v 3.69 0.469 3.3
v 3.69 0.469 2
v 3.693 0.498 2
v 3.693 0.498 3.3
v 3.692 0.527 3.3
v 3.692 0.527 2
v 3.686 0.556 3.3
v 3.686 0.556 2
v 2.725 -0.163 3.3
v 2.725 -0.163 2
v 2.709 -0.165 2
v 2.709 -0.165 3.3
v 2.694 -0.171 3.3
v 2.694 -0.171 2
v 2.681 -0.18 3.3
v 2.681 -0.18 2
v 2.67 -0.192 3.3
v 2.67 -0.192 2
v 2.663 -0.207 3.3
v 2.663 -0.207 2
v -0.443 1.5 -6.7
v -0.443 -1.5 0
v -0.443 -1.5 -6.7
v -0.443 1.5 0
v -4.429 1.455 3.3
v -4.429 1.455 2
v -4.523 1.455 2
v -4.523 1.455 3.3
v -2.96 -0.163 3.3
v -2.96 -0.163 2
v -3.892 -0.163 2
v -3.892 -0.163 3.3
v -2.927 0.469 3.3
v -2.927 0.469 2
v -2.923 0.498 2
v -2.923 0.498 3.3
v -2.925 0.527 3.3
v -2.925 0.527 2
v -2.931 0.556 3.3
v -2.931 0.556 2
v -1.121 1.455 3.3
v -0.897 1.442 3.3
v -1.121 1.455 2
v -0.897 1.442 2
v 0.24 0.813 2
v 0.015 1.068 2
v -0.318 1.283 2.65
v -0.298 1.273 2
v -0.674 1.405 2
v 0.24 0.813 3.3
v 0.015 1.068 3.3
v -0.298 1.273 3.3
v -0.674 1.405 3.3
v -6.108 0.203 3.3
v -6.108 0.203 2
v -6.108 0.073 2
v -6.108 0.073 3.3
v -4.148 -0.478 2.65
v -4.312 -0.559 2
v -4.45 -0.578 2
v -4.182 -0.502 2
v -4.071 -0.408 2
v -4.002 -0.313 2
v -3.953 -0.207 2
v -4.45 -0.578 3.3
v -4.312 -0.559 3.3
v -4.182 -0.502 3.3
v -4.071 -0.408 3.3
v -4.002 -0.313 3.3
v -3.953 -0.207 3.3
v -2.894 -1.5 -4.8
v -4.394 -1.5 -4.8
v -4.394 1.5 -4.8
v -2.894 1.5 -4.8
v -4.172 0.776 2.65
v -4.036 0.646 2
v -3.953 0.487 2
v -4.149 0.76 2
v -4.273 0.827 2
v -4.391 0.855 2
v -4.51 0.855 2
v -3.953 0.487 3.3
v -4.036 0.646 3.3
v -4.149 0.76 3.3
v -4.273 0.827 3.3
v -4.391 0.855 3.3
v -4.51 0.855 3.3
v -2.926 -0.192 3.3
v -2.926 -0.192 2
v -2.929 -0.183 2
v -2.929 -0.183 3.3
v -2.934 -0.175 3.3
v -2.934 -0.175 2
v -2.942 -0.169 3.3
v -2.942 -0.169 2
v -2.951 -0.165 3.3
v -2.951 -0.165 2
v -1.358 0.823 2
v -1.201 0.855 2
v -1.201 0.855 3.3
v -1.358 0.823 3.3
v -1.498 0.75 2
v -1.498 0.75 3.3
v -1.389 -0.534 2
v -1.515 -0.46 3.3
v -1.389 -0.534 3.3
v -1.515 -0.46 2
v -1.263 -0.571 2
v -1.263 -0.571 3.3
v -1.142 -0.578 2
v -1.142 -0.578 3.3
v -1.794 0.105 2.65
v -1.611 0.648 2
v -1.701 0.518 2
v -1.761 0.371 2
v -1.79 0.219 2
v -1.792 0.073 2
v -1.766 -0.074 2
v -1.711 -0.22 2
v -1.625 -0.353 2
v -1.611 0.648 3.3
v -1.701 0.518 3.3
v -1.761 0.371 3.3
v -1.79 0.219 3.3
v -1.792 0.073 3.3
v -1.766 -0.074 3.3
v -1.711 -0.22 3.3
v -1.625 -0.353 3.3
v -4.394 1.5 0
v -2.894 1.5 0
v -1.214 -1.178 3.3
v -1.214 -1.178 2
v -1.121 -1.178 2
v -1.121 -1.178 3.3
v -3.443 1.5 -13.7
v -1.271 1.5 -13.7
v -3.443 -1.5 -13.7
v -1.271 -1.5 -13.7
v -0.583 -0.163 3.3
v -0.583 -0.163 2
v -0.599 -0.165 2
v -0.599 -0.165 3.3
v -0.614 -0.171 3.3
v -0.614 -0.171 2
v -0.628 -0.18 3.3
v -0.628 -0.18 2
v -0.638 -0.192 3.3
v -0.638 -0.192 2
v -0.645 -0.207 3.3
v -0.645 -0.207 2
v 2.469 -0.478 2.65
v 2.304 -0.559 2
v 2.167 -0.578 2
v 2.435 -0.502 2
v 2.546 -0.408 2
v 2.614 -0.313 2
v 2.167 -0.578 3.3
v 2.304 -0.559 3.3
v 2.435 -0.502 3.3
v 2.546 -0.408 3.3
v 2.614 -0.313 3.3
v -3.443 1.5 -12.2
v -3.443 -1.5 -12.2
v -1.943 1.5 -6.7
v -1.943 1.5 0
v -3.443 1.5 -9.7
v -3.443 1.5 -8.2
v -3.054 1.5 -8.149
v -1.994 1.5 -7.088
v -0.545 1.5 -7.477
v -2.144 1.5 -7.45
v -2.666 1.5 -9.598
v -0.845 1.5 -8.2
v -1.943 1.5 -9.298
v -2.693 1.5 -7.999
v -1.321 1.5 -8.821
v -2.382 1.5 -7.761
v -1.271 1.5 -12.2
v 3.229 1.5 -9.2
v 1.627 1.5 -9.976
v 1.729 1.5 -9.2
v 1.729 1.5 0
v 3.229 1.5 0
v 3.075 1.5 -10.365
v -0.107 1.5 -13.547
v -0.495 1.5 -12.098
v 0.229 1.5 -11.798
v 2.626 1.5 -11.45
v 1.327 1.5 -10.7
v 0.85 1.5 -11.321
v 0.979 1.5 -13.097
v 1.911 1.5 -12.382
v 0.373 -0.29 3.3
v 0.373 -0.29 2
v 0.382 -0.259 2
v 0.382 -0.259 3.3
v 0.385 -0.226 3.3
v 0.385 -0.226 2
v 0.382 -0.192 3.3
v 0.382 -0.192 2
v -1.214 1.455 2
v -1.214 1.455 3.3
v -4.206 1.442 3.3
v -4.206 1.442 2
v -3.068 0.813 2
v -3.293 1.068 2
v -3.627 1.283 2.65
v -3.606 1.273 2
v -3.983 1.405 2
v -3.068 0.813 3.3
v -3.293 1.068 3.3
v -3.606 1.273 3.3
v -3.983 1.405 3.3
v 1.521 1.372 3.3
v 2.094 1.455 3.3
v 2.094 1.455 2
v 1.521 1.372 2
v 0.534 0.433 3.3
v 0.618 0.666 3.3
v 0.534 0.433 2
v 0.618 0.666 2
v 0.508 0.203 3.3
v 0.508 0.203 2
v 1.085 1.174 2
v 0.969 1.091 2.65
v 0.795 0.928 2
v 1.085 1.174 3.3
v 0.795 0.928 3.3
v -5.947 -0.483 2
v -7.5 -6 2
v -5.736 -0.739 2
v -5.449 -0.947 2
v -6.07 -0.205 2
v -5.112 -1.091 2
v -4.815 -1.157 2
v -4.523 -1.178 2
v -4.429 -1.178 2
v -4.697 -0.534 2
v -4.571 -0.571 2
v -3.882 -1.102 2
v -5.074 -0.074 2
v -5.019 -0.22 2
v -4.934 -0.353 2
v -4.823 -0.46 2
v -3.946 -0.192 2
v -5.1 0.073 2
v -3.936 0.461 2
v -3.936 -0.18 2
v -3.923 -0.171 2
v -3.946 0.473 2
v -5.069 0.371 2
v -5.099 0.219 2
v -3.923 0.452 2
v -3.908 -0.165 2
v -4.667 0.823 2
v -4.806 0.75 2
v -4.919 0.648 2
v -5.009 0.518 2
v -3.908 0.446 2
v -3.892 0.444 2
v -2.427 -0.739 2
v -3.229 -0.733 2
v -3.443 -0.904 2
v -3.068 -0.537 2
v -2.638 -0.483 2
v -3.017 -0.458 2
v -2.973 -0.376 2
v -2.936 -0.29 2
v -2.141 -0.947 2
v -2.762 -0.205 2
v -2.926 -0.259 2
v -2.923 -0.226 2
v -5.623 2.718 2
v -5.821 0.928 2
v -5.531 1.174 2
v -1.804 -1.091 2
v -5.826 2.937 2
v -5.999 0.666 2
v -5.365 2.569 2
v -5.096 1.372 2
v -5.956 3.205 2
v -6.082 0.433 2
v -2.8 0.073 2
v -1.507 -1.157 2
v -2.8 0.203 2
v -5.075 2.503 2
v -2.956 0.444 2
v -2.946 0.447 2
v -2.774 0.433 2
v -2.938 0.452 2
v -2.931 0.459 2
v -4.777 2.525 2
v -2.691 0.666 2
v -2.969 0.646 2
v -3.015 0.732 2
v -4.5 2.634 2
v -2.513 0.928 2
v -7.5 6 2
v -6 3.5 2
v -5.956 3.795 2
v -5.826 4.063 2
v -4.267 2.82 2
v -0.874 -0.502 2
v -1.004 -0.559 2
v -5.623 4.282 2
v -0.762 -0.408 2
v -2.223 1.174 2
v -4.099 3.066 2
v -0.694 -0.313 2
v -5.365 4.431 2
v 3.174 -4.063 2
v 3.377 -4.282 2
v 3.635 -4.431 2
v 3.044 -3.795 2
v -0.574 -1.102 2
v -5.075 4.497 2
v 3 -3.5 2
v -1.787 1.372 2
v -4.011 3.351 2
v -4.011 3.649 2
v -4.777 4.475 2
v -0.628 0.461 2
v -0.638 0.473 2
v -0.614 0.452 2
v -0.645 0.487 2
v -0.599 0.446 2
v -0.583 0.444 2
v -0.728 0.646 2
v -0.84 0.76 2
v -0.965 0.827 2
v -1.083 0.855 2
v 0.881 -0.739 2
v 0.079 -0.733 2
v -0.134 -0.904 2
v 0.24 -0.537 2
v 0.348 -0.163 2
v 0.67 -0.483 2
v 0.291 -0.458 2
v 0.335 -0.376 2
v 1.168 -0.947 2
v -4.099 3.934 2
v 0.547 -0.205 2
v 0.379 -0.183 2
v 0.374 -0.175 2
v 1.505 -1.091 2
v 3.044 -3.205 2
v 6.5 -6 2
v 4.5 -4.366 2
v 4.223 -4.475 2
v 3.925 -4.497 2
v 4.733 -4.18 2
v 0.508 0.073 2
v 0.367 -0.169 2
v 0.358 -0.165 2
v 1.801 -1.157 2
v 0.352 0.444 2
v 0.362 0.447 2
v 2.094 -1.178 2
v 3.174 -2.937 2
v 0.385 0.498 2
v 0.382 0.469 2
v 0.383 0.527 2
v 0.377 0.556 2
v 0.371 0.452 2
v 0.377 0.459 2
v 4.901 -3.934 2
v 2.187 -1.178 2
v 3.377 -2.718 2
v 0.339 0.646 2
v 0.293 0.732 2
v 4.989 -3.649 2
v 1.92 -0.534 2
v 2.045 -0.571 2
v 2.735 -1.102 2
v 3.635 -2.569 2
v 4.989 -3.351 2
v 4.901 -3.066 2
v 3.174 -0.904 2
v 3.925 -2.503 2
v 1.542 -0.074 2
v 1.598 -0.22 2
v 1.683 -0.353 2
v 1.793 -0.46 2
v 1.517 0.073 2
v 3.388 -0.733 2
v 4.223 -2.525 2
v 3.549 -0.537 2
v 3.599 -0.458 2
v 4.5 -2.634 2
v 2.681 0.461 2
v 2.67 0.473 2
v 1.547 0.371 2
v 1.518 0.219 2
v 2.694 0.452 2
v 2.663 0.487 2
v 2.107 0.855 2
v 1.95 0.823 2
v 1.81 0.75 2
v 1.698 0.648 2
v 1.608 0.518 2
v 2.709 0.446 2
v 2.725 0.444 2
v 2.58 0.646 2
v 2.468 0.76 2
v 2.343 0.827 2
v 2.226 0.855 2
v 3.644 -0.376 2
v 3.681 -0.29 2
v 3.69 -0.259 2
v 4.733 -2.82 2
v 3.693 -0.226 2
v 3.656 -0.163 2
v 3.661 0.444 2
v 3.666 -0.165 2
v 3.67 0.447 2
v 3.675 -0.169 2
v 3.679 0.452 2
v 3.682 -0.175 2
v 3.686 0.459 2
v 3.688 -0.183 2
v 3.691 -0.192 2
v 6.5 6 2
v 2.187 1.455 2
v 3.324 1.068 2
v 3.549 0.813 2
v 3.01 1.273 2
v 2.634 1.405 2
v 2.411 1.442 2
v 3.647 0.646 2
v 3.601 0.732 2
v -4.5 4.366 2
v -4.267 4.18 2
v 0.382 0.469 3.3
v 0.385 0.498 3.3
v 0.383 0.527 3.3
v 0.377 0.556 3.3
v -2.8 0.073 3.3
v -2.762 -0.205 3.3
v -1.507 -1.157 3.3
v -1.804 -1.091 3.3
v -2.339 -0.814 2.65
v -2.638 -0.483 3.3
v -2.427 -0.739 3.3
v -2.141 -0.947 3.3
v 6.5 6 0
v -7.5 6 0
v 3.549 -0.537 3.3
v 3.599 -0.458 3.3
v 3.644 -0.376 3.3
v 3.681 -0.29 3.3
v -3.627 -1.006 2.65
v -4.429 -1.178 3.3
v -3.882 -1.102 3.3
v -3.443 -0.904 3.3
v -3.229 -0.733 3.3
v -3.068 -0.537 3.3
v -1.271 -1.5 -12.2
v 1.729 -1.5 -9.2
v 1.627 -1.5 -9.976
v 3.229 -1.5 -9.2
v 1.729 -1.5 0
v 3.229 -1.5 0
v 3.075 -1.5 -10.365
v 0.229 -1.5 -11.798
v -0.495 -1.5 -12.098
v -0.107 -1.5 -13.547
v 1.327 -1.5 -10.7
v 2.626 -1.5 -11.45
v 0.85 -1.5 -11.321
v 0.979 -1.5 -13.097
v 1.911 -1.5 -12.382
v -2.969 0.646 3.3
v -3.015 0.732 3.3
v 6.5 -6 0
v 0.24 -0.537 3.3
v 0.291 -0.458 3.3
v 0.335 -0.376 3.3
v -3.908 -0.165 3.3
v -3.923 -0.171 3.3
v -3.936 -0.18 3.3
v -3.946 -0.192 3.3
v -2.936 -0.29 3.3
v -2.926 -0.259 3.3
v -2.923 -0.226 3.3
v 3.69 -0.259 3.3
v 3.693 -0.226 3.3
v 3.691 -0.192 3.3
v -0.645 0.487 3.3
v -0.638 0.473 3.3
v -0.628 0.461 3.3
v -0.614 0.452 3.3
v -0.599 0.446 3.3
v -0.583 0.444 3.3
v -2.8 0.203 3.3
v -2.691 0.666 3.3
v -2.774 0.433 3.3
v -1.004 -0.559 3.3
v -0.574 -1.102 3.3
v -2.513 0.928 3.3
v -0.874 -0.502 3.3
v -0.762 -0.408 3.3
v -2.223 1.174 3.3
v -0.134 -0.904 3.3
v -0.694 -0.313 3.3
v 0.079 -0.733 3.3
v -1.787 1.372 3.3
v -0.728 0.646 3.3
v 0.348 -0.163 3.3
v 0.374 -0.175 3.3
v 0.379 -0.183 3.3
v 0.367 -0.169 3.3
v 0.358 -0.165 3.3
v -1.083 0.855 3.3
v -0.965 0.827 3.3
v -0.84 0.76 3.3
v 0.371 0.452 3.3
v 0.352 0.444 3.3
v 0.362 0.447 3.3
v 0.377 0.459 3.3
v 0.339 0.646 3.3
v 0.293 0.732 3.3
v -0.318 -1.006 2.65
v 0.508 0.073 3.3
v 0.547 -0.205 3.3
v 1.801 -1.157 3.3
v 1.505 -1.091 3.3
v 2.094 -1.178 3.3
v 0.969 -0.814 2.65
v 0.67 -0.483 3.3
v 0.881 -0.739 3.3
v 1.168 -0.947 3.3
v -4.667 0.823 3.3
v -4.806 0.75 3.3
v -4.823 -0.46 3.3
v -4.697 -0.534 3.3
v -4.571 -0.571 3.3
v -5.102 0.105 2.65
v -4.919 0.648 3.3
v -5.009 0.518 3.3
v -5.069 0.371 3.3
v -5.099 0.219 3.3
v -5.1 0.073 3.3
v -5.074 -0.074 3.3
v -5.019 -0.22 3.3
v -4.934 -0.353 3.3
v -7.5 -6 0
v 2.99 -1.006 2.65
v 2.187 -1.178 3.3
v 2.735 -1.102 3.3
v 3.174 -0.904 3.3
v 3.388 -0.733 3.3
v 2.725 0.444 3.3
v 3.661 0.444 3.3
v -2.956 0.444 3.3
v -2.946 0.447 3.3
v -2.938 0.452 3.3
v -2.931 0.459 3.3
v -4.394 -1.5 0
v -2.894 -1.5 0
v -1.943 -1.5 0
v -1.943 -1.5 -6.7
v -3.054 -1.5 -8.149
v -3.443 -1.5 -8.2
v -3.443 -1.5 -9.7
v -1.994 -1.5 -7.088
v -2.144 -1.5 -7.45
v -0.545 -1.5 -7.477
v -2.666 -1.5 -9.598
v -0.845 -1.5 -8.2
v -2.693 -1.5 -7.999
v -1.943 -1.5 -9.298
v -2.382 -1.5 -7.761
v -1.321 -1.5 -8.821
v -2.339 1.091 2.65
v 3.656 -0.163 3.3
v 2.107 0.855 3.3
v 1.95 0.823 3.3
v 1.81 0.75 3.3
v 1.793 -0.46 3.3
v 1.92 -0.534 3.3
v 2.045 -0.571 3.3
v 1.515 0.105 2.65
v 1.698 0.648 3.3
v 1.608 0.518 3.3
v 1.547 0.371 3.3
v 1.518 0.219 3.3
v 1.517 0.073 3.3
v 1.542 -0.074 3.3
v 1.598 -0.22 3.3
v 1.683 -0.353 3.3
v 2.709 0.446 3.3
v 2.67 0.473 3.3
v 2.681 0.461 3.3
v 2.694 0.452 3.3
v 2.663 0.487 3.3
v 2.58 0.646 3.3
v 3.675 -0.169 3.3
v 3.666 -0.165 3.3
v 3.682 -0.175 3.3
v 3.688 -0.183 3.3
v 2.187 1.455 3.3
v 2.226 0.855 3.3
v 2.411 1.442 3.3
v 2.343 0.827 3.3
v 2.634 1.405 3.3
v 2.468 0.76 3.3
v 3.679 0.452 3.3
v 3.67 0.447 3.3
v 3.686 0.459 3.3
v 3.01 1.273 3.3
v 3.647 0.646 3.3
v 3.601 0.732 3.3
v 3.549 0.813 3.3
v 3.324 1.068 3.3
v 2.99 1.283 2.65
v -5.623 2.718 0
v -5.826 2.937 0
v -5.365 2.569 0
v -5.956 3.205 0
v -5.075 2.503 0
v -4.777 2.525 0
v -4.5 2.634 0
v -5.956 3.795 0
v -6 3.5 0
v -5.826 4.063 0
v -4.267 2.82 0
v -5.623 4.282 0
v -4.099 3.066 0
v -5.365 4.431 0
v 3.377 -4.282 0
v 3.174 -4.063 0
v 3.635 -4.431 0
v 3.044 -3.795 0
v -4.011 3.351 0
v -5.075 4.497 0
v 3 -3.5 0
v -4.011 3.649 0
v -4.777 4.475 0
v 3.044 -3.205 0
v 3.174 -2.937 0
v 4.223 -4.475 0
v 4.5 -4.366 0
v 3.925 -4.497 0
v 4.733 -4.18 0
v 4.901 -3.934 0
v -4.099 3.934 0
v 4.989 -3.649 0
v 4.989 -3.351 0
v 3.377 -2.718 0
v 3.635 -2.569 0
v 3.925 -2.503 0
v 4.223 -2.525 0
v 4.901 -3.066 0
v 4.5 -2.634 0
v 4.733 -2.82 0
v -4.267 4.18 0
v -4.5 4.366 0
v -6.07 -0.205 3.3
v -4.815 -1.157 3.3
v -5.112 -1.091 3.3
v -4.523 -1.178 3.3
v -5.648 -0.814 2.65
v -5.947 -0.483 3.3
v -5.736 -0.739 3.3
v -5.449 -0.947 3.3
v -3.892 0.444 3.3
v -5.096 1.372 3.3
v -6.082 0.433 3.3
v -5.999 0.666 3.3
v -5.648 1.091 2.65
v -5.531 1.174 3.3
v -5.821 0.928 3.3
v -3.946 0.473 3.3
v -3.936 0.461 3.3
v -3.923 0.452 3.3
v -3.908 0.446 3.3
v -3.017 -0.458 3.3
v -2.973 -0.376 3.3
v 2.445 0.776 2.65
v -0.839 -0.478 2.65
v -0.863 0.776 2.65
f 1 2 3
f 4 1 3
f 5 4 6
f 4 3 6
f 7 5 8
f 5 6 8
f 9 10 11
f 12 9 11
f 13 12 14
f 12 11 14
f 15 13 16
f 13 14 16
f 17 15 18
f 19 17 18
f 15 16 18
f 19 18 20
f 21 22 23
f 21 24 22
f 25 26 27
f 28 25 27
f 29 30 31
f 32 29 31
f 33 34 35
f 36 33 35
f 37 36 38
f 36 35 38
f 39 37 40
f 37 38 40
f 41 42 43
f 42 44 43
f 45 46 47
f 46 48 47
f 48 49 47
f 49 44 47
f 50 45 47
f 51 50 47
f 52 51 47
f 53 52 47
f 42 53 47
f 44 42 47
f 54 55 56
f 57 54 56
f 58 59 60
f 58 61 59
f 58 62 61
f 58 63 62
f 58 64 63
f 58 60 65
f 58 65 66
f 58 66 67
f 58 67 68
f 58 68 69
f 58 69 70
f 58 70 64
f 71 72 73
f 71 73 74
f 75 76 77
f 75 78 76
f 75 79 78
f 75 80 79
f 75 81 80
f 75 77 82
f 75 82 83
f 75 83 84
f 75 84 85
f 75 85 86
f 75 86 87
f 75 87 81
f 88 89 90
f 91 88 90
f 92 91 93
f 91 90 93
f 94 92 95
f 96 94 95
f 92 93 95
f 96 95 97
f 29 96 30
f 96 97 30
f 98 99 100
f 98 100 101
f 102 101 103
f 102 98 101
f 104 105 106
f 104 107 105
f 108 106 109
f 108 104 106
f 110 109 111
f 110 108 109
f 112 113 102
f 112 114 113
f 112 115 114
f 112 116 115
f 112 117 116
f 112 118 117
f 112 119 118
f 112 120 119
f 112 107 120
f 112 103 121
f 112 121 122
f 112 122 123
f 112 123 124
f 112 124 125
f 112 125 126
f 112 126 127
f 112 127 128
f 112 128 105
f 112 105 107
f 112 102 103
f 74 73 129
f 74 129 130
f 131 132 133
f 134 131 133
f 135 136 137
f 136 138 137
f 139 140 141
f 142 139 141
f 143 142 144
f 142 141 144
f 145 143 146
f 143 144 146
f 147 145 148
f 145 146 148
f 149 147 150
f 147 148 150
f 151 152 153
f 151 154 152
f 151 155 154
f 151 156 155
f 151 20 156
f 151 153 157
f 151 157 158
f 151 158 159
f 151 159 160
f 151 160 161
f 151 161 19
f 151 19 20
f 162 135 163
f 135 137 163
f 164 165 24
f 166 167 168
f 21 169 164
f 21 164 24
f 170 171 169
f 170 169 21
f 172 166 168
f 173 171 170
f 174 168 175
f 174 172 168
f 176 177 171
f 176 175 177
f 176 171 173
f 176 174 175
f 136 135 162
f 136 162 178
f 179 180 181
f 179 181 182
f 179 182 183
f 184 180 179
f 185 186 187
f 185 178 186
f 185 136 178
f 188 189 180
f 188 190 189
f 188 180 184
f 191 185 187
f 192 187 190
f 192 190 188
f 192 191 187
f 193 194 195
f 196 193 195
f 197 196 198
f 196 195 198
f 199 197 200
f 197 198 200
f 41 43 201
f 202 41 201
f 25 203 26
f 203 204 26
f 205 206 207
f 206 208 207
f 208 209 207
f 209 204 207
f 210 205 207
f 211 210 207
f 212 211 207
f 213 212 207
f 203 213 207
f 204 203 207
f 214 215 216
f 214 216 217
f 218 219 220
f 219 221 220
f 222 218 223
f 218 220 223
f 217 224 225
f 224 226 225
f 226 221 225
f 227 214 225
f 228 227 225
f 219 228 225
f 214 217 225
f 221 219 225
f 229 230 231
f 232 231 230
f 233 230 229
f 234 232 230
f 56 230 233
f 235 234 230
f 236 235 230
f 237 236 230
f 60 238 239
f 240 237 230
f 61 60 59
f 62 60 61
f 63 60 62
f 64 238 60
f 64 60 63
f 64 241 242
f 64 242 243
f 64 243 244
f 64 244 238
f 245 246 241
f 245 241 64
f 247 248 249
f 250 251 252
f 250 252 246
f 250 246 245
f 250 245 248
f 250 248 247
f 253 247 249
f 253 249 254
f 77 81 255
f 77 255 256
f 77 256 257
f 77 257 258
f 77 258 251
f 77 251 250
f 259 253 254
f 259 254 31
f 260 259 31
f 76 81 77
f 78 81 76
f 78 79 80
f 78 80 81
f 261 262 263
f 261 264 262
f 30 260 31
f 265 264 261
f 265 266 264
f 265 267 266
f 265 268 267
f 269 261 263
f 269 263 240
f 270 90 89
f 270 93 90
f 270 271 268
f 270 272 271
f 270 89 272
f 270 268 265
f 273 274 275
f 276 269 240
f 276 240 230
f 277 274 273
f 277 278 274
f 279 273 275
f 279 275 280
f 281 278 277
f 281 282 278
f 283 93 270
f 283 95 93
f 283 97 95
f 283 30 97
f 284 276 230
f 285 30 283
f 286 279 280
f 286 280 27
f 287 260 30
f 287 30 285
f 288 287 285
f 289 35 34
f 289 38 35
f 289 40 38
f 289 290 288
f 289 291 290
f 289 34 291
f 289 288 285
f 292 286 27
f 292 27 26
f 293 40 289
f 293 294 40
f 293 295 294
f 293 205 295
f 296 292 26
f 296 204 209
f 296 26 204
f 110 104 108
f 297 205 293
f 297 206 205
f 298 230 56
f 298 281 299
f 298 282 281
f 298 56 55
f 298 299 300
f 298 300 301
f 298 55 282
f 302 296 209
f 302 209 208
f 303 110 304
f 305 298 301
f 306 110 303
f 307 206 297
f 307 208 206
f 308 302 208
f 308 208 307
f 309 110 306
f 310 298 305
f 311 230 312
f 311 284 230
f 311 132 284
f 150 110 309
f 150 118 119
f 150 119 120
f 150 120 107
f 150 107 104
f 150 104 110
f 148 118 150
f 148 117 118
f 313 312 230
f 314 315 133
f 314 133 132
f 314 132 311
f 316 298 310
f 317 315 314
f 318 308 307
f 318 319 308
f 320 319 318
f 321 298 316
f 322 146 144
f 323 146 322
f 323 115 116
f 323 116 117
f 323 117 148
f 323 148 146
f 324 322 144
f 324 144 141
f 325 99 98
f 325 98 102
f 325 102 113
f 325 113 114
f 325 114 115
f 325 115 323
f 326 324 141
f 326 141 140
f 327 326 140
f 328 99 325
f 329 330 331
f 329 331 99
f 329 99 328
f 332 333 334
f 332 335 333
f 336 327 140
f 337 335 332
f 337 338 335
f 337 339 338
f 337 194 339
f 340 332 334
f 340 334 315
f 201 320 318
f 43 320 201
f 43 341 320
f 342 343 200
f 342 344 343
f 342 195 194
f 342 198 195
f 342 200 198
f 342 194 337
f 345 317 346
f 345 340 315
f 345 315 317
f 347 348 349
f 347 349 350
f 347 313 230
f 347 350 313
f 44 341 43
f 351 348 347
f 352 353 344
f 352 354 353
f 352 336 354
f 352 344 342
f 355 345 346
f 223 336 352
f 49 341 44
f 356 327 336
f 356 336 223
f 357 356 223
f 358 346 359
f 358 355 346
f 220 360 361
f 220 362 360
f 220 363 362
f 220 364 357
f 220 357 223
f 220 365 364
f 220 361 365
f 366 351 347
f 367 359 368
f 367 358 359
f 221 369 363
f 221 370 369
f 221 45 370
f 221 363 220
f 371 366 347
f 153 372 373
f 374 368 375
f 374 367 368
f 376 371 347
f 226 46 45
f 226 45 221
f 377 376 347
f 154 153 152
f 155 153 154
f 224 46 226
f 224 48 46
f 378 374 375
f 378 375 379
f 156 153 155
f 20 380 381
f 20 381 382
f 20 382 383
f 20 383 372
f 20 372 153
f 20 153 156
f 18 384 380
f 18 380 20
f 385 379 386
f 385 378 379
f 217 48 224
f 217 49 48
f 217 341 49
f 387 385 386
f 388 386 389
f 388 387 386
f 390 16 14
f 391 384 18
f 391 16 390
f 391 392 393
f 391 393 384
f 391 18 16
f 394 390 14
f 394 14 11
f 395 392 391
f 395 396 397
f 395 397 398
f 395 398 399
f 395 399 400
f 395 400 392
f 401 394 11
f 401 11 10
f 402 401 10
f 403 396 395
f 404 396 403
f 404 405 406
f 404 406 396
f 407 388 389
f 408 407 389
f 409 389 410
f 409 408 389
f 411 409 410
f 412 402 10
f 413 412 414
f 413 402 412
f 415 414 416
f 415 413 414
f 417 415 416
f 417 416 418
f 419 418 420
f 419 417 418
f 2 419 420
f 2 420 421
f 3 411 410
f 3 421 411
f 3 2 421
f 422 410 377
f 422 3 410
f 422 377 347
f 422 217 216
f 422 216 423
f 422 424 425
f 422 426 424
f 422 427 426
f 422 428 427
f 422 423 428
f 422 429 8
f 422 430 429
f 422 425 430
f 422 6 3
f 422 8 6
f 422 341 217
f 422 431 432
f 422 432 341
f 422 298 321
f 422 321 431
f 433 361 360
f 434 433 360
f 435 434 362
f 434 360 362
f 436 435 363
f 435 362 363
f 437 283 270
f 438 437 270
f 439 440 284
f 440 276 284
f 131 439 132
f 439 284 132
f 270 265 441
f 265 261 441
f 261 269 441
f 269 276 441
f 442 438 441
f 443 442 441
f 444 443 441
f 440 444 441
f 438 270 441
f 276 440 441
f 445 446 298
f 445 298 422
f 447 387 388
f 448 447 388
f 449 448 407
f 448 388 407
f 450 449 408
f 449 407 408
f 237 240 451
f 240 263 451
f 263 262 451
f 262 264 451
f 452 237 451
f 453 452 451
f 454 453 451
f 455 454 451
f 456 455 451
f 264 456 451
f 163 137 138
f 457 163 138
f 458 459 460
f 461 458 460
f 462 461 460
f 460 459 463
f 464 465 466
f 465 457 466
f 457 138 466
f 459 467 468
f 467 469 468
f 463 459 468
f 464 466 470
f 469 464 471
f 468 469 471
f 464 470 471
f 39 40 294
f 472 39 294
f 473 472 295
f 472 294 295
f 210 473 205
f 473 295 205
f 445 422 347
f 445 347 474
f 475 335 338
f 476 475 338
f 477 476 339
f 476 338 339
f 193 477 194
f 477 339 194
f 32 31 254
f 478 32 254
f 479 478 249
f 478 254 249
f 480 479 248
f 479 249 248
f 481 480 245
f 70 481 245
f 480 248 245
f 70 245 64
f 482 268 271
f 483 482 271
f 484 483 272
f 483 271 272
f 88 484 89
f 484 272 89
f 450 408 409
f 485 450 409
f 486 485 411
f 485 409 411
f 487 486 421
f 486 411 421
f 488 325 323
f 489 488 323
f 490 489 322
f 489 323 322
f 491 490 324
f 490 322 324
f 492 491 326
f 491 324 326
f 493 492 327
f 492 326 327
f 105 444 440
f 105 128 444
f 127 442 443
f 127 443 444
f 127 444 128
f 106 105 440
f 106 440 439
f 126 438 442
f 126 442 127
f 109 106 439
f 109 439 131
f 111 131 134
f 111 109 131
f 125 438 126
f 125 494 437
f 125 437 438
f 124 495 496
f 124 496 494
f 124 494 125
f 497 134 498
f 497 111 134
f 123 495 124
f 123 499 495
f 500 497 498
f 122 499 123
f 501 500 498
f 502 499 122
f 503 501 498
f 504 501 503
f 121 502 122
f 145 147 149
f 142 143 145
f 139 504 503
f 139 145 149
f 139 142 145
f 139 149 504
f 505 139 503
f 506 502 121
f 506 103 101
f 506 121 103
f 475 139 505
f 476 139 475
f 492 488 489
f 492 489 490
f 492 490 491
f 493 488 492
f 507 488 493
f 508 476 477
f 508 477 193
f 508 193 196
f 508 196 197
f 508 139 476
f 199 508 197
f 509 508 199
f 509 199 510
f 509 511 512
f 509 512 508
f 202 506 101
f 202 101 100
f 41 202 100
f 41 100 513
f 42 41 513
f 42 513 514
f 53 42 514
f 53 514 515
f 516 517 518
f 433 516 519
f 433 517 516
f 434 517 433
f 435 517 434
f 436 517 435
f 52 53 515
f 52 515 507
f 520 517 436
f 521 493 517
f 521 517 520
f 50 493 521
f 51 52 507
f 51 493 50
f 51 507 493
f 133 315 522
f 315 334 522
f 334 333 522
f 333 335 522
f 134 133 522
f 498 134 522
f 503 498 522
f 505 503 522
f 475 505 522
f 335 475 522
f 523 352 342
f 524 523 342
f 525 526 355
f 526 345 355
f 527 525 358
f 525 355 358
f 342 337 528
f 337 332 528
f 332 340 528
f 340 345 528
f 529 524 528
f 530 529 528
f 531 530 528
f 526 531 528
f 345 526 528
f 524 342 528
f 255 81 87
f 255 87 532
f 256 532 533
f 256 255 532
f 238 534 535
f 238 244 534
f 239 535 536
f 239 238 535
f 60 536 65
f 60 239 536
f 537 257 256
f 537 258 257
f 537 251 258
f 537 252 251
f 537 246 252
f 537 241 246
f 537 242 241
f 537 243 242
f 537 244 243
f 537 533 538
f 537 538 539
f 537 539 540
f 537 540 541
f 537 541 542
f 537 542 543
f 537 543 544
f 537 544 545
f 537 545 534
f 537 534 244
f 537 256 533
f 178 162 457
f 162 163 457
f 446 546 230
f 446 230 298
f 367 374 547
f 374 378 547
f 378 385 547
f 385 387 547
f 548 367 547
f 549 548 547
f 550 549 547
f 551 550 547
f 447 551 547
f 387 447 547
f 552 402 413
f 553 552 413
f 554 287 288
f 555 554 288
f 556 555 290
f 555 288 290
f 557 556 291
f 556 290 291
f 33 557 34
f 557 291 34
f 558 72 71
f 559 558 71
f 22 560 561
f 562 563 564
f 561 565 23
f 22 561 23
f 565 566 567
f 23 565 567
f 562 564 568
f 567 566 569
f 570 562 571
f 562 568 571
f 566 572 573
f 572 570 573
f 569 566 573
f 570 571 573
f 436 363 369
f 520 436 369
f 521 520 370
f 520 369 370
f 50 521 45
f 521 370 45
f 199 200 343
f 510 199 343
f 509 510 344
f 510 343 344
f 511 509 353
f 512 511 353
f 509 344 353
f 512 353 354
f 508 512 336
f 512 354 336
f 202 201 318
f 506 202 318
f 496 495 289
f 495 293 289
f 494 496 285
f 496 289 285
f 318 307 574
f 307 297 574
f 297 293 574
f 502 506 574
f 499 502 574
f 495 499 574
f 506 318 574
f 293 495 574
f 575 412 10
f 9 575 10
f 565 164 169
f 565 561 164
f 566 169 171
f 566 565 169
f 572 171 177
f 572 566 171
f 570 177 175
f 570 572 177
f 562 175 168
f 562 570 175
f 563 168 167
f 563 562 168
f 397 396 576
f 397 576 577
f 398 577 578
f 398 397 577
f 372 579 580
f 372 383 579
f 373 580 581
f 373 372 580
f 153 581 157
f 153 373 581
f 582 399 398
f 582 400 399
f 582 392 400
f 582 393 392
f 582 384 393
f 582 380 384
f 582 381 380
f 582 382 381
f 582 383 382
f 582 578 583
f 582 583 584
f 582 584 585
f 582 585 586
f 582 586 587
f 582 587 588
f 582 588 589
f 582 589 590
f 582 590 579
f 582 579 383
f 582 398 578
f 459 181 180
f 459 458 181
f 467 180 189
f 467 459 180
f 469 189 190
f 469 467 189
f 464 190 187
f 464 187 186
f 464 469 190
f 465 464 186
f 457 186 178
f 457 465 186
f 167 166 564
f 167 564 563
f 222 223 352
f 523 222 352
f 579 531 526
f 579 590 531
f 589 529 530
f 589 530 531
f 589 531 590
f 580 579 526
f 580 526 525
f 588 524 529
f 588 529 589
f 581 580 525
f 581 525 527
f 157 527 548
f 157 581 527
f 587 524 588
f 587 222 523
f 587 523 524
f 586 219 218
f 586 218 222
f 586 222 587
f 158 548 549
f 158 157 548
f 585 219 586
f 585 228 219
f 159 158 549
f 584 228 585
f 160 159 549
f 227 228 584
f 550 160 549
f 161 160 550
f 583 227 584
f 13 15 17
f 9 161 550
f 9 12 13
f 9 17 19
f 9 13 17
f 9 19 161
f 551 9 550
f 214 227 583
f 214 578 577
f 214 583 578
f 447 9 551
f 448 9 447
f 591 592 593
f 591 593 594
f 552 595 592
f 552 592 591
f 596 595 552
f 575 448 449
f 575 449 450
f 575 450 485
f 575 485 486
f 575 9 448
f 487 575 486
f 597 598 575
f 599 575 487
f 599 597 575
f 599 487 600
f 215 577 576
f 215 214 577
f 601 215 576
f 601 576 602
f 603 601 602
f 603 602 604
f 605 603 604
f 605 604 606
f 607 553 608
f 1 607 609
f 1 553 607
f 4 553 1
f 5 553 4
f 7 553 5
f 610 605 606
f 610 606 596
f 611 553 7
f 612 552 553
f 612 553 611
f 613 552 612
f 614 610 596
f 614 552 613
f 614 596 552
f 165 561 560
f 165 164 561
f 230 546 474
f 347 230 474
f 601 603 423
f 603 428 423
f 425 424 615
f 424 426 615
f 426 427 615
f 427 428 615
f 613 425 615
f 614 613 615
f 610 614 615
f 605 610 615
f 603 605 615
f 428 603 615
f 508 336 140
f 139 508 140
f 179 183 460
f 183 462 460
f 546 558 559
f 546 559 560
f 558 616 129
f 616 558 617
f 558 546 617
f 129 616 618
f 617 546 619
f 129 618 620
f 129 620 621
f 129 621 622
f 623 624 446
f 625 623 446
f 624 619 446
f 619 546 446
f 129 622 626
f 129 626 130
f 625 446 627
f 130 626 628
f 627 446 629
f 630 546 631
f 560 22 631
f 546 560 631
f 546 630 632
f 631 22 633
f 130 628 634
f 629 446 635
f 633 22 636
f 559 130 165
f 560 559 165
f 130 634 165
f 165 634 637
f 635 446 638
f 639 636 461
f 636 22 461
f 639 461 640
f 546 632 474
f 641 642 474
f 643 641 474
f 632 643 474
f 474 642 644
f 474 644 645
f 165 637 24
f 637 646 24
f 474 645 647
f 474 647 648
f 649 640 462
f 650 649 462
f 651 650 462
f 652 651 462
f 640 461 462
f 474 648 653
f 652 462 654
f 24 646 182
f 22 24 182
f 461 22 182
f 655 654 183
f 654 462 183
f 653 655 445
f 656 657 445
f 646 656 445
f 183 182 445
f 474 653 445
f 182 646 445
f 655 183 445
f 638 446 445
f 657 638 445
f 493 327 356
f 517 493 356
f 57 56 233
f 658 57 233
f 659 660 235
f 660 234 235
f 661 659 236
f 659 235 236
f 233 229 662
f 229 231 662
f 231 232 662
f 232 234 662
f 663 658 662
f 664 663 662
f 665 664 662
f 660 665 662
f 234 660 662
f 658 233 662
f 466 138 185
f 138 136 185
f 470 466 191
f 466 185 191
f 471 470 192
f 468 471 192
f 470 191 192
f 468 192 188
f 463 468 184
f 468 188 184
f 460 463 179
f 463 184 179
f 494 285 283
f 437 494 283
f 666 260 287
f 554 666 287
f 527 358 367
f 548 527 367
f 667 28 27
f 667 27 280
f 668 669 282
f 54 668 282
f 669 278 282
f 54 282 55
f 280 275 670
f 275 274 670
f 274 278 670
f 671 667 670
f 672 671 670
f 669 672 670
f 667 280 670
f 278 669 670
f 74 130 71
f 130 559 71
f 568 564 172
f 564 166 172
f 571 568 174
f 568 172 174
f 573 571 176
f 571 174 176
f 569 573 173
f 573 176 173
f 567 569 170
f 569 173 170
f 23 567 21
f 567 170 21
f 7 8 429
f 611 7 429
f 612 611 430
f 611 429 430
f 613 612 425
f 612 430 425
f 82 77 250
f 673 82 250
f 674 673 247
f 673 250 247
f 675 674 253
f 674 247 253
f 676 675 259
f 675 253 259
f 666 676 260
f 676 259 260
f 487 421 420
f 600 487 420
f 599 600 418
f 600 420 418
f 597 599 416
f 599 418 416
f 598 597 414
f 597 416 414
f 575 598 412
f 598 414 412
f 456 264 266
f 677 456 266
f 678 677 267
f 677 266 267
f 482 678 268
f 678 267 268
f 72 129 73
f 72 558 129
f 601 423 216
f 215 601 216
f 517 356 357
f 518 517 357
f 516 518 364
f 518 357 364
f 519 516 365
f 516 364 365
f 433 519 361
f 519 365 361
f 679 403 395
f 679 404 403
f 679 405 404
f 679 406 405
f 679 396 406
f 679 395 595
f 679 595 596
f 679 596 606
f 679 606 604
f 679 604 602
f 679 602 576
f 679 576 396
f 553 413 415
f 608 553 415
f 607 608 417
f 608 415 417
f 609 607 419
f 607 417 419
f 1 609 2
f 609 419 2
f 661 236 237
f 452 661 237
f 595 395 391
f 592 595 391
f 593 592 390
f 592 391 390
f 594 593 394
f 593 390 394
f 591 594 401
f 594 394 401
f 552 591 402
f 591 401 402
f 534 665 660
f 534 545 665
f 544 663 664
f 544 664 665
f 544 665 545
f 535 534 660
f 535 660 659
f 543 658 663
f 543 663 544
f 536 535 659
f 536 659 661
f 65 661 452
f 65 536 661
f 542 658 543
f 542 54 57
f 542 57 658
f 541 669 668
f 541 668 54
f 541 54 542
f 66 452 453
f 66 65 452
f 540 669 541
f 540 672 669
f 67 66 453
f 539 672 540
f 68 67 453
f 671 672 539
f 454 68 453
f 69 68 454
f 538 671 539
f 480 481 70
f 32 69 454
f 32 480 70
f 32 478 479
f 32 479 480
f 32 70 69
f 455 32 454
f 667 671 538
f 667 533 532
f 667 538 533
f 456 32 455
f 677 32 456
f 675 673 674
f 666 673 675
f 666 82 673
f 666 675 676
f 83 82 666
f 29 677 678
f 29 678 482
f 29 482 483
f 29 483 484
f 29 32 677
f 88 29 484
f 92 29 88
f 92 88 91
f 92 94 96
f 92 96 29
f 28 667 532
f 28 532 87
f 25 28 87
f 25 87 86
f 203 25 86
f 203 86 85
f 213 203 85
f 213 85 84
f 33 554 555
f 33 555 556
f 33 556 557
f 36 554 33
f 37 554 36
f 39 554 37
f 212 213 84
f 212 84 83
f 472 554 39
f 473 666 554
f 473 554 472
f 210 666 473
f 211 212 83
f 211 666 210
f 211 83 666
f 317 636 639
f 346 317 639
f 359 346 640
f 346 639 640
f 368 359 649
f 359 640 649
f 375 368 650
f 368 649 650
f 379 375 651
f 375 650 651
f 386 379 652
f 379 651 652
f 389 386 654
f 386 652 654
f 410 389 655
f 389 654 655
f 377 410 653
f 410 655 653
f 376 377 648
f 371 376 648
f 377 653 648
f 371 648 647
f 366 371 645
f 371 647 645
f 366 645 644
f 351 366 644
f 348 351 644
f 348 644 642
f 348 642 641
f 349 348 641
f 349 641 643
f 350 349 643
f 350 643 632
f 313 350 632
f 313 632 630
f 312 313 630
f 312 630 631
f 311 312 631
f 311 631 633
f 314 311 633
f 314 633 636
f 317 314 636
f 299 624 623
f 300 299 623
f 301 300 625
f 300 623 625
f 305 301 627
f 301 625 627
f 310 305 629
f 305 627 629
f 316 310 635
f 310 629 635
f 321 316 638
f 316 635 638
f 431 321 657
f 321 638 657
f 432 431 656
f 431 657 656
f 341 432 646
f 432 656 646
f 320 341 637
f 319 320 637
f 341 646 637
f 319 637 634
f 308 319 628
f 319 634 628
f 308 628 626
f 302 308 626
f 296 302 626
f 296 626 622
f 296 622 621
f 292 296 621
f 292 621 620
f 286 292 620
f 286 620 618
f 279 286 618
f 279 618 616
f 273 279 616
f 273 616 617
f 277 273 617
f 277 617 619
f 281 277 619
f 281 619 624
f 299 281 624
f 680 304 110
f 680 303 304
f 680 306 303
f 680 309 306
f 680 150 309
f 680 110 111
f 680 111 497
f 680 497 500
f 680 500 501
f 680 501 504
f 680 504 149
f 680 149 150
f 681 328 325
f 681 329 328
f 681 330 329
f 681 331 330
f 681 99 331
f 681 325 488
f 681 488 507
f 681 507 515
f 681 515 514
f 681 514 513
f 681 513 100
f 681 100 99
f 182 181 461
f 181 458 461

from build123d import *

# Parameters (mm, degrees)
SKETCH1_W           = 15
SKETCH1_H           = 12
BOSS_EXTRUDE1_DEPTH = 2
BOSS_EXTRUDE2_DEPTH = 2
SKETCH3_W           = 1.5
SKETCH3_H           = 4.8
BOSS_EXTRUDE3_DEPTH = 1.5
FILLET3_R           = 1.5
FILLET4_R           = 3
FILLET5_R           = 3
FILLET6_R           = 4.5
SKETCH4_W           = 2
SKETCH4_H           = 12
CUT_EXTRUDE1_DEPTH  = 1
SKETCH5_R           = 1
CUT_EXTRUDE2_DEPTH  = 17.731407672
CUT_EXTRUDE3_START  = -0.7
CUT_EXTRUDE3_DEPTH  = 0.7


with BuildPart() as part:
    # Sketch1 → Boss-Extrude1 (new body)
    with BuildSketch(Plane.XY):
        Rectangle(SKETCH1_W, SKETCH1_H)
    extrude(amount=BOSS_EXTRUDE1_DEPTH)

    # Sketch2 → Boss-Extrude2 (add)
    with BuildSketch(Plane.XY.offset(2)):
        with BuildLine():
            Line((-0.583484164, 0.443787032), (0.352350759, 0.443787032))
            ThreePointArc((0.352350759, 0.443787032), (0.370660979, 0.451874829), (0.381594807, 0.468641703))
            ThreePointArc((0.381594807, 0.468641703), (0.38478126, 0.512633483), (0.377406248, 0.556119567))
            ThreePointArc((0.377406248, 0.556119567), (0.316958398, 0.689104808), (0.240244136, 0.81341868))
            add(Edge.make_bspline(
                [(0.240244136, 0.81341868), (-0.178053426, 1.454553053), (-1.120854898, 1.454553053)],
                knots=[3.484341046, 3.484341046, 3.484341046, 4.522924348, 4.522924348, 4.522924348], degree=2, weights=[1, 0.868170926, 1]))
            Line((-1.120854898, 1.454553053), (-1.214475951, 1.454553068))
            add(Edge.make_bspline(
                [(-1.214475951, 1.454553068), (-2.800132813, 1.454553068), (-2.800132813, 0.203397992)],
                knots=[1.670440536, 1.670440536, 1.670440536, 3.203377674, 3.203377674, 3.203377674], degree=2, weights=[1, 0.720364542, 1]))
            Line((-2.800132813, 0.203397992), (-2.800132806, 0.073267738))
            add(Edge.make_bspline(
                [(-2.800132806, 0.073267738), (-2.800132806, -1.177887338), (-1.214475944, -1.177887338)],
                knots=[3.079807634, 3.079807634, 3.079807634, 4.612744771, 4.612744771, 4.612744771], degree=2, weights=[1, 0.720364542, 1]))
            Line((-1.214475944, -1.177887338), (-1.120854891, -1.177887375))
            add(Edge.make_bspline(
                [(-1.120854891, -1.177887375), (-0.178053419, -1.177887375), (0.240244143, -0.536753002)],
                knots=[1.760260959, 1.760260959, 1.760260959, 2.798844261, 2.798844261, 2.798844261], degree=2, weights=[1, 0.868170926, 1]))
            ThreePointArc((0.240244143, -0.536753002), (0.313994237, -0.417650167), (0.372658208, -0.290437354))
            ThreePointArc((0.372658208, -0.290437354), (0.384251196, -0.24211404), (0.382489087, -0.192450825))
            ThreePointArc((0.382489087, -0.192450825), (0.370484527, -0.171527836), (0.347824512, -0.163257123))
            Line((0.347824512, -0.163257123), (-0.58348421, -0.163257123))
            ThreePointArc((-0.58348421, -0.163257123), (-0.62125204, -0.175257922), (-0.645165579, -0.206858093))
            add(Edge.make_bspline(
                [(-1.141657158, -0.577741646), (-0.776549247, -0.578100851), (-0.645165579, -0.206858093)],
                knots=[5.955155363, 5.955155363, 5.955155363, 7.020735545, 7.020735545, 7.020735545], degree=2, weights=[1, 0.86139323, 1]))
            add(Edge.make_bspline(
                [(-1.201450314, 0.854894524), (-1.823540048, 0.823436889), (-1.793554178, 0.104979402), (-1.763568309, -0.613478086), (-1.141657158, -0.577741646)],
                knots=[0.039432941, 0.039432941, 0.039432941, 1.613207044, 1.613207044, 3.186981147, 3.186981147, 3.186981147], degree=2, weights=[1, 0.706053195, 1, 0.706053195, 1]))
            add(Edge.make_bspline(
                [(-0.645165584, 0.487388037), (-0.79140441, 0.900606071), (-1.201450314, 0.854894524)],
                knots=[2.404042441, 2.404042441, 2.404042441, 3.565685694, 3.565685694, 3.565685694], degree=2, weights=[1, 0.836012096, 1]))
            ThreePointArc((-0.645165584, 0.487388037), (-0.621252025, 0.455787841), (-0.583484164, 0.443787032))
        make_face()
        with BuildLine():
            Line((-3.89178871, 0.443787032), (-2.955953786, 0.443787032))
            ThreePointArc((-2.955953786, 0.443787032), (-2.937643536, 0.451874816), (-2.926709688, 0.468641703))
            ThreePointArc((-2.926709688, 0.468641703), (-2.923523234, 0.512633483), (-2.930898247, 0.556119567))
            ThreePointArc((-2.930898247, 0.556119567), (-2.991346096, 0.689104808), (-3.068060358, 0.81341868))
            add(Edge.make_bspline(
                [(-3.068060358, 0.81341868), (-3.48635792, 1.454553053), (-4.429159392, 1.454553053)],
                knots=[3.484341046, 3.484341046, 3.484341046, 4.522924348, 4.522924348, 4.522924348], degree=2, weights=[1, 0.868170926, 1]))
            Line((-4.429159392, 1.454553053), (-4.522780446, 1.454553068))
            add(Edge.make_bspline(
                [(-4.522780446, 1.454553068), (-6.108437307, 1.454553068), (-6.108437307, 0.203397992)],
                knots=[4.81203319, 4.81203319, 4.81203319, 6.344970327, 6.344970327, 6.344970327], degree=2, weights=[1, 0.720364542, 1]))
            Line((-6.108437307, 0.203397992), (-6.108437352, 0.073267738))
            add(Edge.make_bspline(
                [(-6.108437352, 0.073267738), (-6.108437352, -1.177887338), (-4.52278049, -1.177887338)],
                knots=[6.221400287, 6.221400287, 6.221400287, 7.754337425, 7.754337425, 7.754337425], degree=2, weights=[1, 0.720364542, 1]))
            Line((-4.52278049, -1.177887338), (-4.429159437, -1.177887375))
            add(Edge.make_bspline(
                [(-4.429159437, -1.177887375), (-3.486357965, -1.177887375), (-3.068060402, -0.536753002)],
                knots=[1.760260959, 1.760260959, 1.760260959, 2.798844261, 2.798844261, 2.798844261], degree=2, weights=[1, 0.868170926, 1]))
            ThreePointArc((-3.068060402, -0.536753002), (-2.994310308, -0.417650167), (-2.935646337, -0.290437354))
            ThreePointArc((-2.935646337, -0.290437354), (-2.92405335, -0.24211404), (-2.925815458, -0.192450825))
            ThreePointArc((-2.925815458, -0.192450825), (-2.937820019, -0.171527836), (-2.960480033, -0.163257123))
            Line((-2.960480033, -0.163257123), (-3.891788755, -0.163257123))
            ThreePointArc((-3.891788755, -0.163257123), (-3.929556585, -0.175257922), (-3.953470124, -0.206858093))
            add(Edge.make_bspline(
                [(-4.449961703, -0.577741646), (-4.084853792, -0.578100851), (-3.953470124, -0.206858093)],
                knots=[5.955155363, 5.955155363, 5.955155363, 7.020735545, 7.020735545, 7.020735545], degree=2, weights=[1, 0.86139323, 1]))
            add(Edge.make_bspline(
                [(-4.509754859, 0.854894524), (-5.131844593, 0.82343689), (-5.101858724, 0.104979402), (-5.071872854, -0.613478086), (-4.449961703, -0.577741646)],
                knots=[0.039432941, 0.039432941, 0.039432941, 1.613207044, 1.613207044, 3.186981147, 3.186981147, 3.186981147], degree=2, weights=[1, 0.706053195, 1, 0.706053195, 1]))
            add(Edge.make_bspline(
                [(-3.95347013, 0.487388037), (-4.099708956, 0.900606071), (-4.509754859, 0.854894524)],
                knots=[2.40404244, 2.40404244, 2.40404244, 3.565685694, 3.565685694, 3.565685694], degree=2, weights=[1, 0.836012096, 1]))
            ThreePointArc((-3.95347013, 0.487388037), (-3.92955657, 0.455787841), (-3.89178871, 0.443787032))
        make_face()
        with BuildLine():
            Line((2.724820382, 0.443787032), (3.660655305, 0.443787032))
            ThreePointArc((3.660655305, 0.443787032), (3.678965525, 0.451874829), (3.689899353, 0.468641703))
            ThreePointArc((3.689899353, 0.468641703), (3.693085806, 0.512633483), (3.685710794, 0.556119567))
            ThreePointArc((3.685710794, 0.556119567), (3.625262944, 0.689104808), (3.548548682, 0.81341868))
            add(Edge.make_bspline(
                [(3.548548682, 0.81341868), (3.13025112, 1.454553053), (2.187449648, 1.454553053)],
                knots=[0.342748392, 0.342748392, 0.342748392, 1.381331695, 1.381331695, 1.381331695], degree=2, weights=[1, 0.868170926, 1]))
            Line((2.187449648, 1.454553053), (2.093828595, 1.454553068))
            add(Edge.make_bspline(
                [(2.093828595, 1.454553068), (0.508171733, 1.454553068), (0.508171733, 0.203397992)],
                knots=[4.81203319, 4.81203319, 4.81203319, 6.344970327, 6.344970327, 6.344970327], degree=2, weights=[1, 0.720364542, 1]))
            Line((0.508171733, 0.203397992), (0.50817174, 0.073267738))
            add(Edge.make_bspline(
                [(0.50817174, 0.073267738), (0.50817174, -1.177887338), (2.093828602, -1.177887338)],
                knots=[3.079807634, 3.079807634, 3.079807634, 4.612744771, 4.612744771, 4.612744771], degree=2, weights=[1, 0.720364542, 1]))
            Line((2.093828602, -1.177887338), (2.187449655, -1.177887375))
            add(Edge.make_bspline(
                [(2.187449655, -1.177887375), (3.130251127, -1.177887375), (3.548548689, -0.536753002)],
                knots=[1.760260959, 1.760260959, 1.760260959, 2.798844261, 2.798844261, 2.798844261], degree=2, weights=[1, 0.868170926, 1]))
            ThreePointArc((3.548548689, -0.536753002), (3.622298783, -0.417650167), (3.680962754, -0.290437354))
            ThreePointArc((3.680962754, -0.290437354), (3.692555742, -0.24211404), (3.690793633, -0.192450825))
            ThreePointArc((3.690793633, -0.192450825), (3.678789073, -0.171527836), (3.656129058, -0.163257123))
            Line((3.656129058, -0.163257123), (2.724820336, -0.163257123))
            ThreePointArc((2.724820336, -0.163257123), (2.687052506, -0.175257922), (2.663138967, -0.206858093))
            add(Edge.make_bspline(
                [(2.166647388, -0.577741646), (2.531755299, -0.578100851), (2.663138967, -0.206858093)],
                knots=[5.955155363, 5.955155363, 5.955155363, 7.020735545, 7.020735545, 7.020735545], degree=2, weights=[1, 0.86139323, 1]))
            add(Edge.make_bspline(
                [(2.106854232, 0.854894524), (1.484764498, 0.823436889), (1.514750368, 0.104979402), (1.544736237, -0.613478086), (2.166647388, -0.577741646)],
                knots=[3.181025595, 3.181025595, 3.181025595, 4.754799698, 4.754799698, 6.328573801, 6.328573801, 6.328573801], degree=2, weights=[1, 0.706053195, 1, 0.706053195, 1]))
            add(Edge.make_bspline(
                [(2.663138962, 0.487388037), (2.516900136, 0.900606071), (2.106854232, 0.854894524)],
                knots=[5.545635094, 5.545635094, 5.545635094, 6.707278348, 6.707278348, 6.707278348], degree=2, weights=[1, 0.836012096, 1]))
            ThreePointArc((2.663138962, 0.487388037), (2.687052521, 0.455787841), (2.724820382, 0.443787032))
        make_face()
    extrude(amount=BOSS_EXTRUDE2_DEPTH)

    # Sketch3 → Boss-Extrude3 (add, symmetric)
    with BuildSketch(Plane(origin=(0, 0, 0), x_dir=(1, 0, 0), z_dir=(0, 1, 0))):
        Polygon((1.72873188, 0), (3.22873188, 0), (3.22873188, 13.7), (-3.442646753, 13.7), (-3.442646753, 12.2), (1.72873188, 12.2), align=None)
        with Locations((-3.644025381, 2.4)):
            Rectangle(SKETCH3_W, SKETCH3_H)
        Polygon((-1.942646753, 0), (-0.442646753, 0), (-0.442646753, 9.7), (-3.442646753, 9.7), (-3.442646753, 8.2), (-1.942646753, 8.2), align=None)
    extrude(amount=BOSS_EXTRUDE3_DEPTH, both=True)

    # Fillet3
    fillet3_edges = [part.edges().sort_by_distance(p)[0] for p in [
        (-1.942646753, 0, -8.2),
    ]]
    fillet(fillet3_edges, radius=FILLET3_R - 0.0001)  # a hair under: the kernel refuses the full size

    # Fillet4
    fillet4_edges = [part.edges().sort_by_distance(p)[0] for p in [
        (-0.442646753, 0, -9.7),
    ]]
    fillet(fillet4_edges, radius=FILLET4_R - 0.0001)  # a hair under: the kernel refuses the full size

    # Fillet5
    fillet5_edges = [part.edges().sort_by_distance(p)[0] for p in [
        (1.72873188, 0, -12.2),
    ]]
    fillet(fillet5_edges, radius=FILLET5_R)

    # Fillet6
    fillet6_edges = [part.edges().sort_by_distance(p)[0] for p in [
        (3.22873188, 0, -13.7),
    ]]
    fillet(fillet6_edges, radius=FILLET6_R)

    # Sketch4 → Cut-Extrude1 (cut)
    with BuildSketch(Plane(origin=(7.5, 0, 0), x_dir=(0, 0, -1), z_dir=(1, 0, 0))):
        with Locations((-1, 0)):
            Rectangle(SKETCH4_W, SKETCH4_H)
    extrude(amount=-CUT_EXTRUDE1_DEPTH, mode=Mode.SUBTRACT)

    # Sketch5 → Cut-Extrude2 (cut, through all)
    with BuildSketch(Plane(origin=(0, 0, 0), x_dir=(-1, 0, 0), z_dir=(0, 0, -1))):
        with Locations((-4, -3.5)):
            Circle(SKETCH5_R)
        with Locations((5, 3.5)):
            Circle(SKETCH5_R)
    extrude(amount=-CUT_EXTRUDE2_DEPTH, mode=Mode.SUBTRACT)

    # Sketch6 → Cut-Extrude3 (cut)
    with BuildSketch(Plane.XY.offset(4).offset(CUT_EXTRUDE3_START)):
        with BuildLine():
            Line((2.724820382, 0.443787032), (3.660655305, 0.443787032))
            ThreePointArc((3.660655305, 0.443787032), (3.678965525, 0.451874829), (3.689899353, 0.468641703))
            ThreePointArc((3.689899353, 0.468641703), (3.693085806, 0.512633483), (3.685710794, 0.556119567))
            ThreePointArc((3.685710794, 0.556119567), (3.625262944, 0.689104808), (3.548548682, 0.81341868))
            add(Edge.make_bspline(
                [(3.548548682, 0.81341868), (3.13025112, 1.454553053), (2.187449648, 1.454553053)],
                knots=[0.342748392, 0.342748392, 0.342748392, 1.381331695, 1.381331695, 1.381331695], degree=2, weights=[1, 0.868170926, 1]))
            Line((2.187449648, 1.454553053), (2.093828595, 1.454553068))
            add(Edge.make_bspline(
                [(2.093828595, 1.454553068), (0.508171733, 1.454553068), (0.508171733, 0.203397992)],
                knots=[4.81203319, 4.81203319, 4.81203319, 6.344970327, 6.344970327, 6.344970327], degree=2, weights=[1, 0.720364542, 1]))
            Line((0.508171733, 0.203397992), (0.50817174, 0.073267738))
            add(Edge.make_bspline(
                [(0.50817174, 0.073267738), (0.50817174, -1.177887338), (2.093828602, -1.177887338)],
                knots=[3.079807634, 3.079807634, 3.079807634, 4.612744771, 4.612744771, 4.612744771], degree=2, weights=[1, 0.720364542, 1]))
            Line((2.093828602, -1.177887338), (2.187449655, -1.177887375))
            add(Edge.make_bspline(
                [(2.187449655, -1.177887375), (3.130251127, -1.177887375), (3.548548689, -0.536753002)],
                knots=[1.760260959, 1.760260959, 1.760260959, 2.798844261, 2.798844261, 2.798844261], degree=2, weights=[1, 0.868170926, 1]))
            ThreePointArc((3.548548689, -0.536753002), (3.622298783, -0.417650167), (3.680962754, -0.290437354))
            ThreePointArc((3.680962754, -0.290437354), (3.692555742, -0.24211404), (3.690793633, -0.192450825))
            ThreePointArc((3.690793633, -0.192450825), (3.678789073, -0.171527836), (3.656129058, -0.163257123))
            Line((3.656129058, -0.163257123), (2.724820336, -0.163257123))
            ThreePointArc((2.724820336, -0.163257123), (2.687052506, -0.175257922), (2.663138967, -0.206858093))
            add(Edge.make_bspline(
                [(2.166647388, -0.577741646), (2.531755299, -0.578100851), (2.663138967, -0.206858093)],
                knots=[5.955155363, 5.955155363, 5.955155363, 7.020735545, 7.020735545, 7.020735545], degree=2, weights=[1, 0.86139323, 1]))
            add(Edge.make_bspline(
                [(2.106854232, 0.854894524), (1.484764498, 0.823436889), (1.514750368, 0.104979402), (1.544736237, -0.613478086), (2.166647388, -0.577741646)],
                knots=[3.181025595, 3.181025595, 3.181025595, 4.754799698, 4.754799698, 6.328573801, 6.328573801, 6.328573801], degree=2, weights=[1, 0.706053195, 1, 0.706053195, 1]))
            add(Edge.make_bspline(
                [(2.663138962, 0.487388037), (2.516900136, 0.900606071), (2.106854232, 0.854894524)],
                knots=[2.404042441, 2.404042441, 2.404042441, 3.565685694, 3.565685694, 3.565685694], degree=2, weights=[1, 0.836012096, 1]))
            ThreePointArc((2.663138962, 0.487388037), (2.687052521, 0.455787841), (2.724820382, 0.443787032))
        make_face()
        with BuildLine():
            Line((-0.583484164, 0.443787032), (0.352350759, 0.443787032))
            ThreePointArc((0.352350759, 0.443787032), (0.370660979, 0.451874829), (0.381594807, 0.468641703))
            ThreePointArc((0.381594807, 0.468641703), (0.38478126, 0.512633483), (0.377406248, 0.556119567))
            ThreePointArc((0.377406248, 0.556119567), (0.316958398, 0.689104808), (0.240244136, 0.81341868))
            add(Edge.make_bspline(
                [(0.240244136, 0.81341868), (-0.178053426, 1.454553053), (-1.120854898, 1.454553053)],
                knots=[0.342748392, 0.342748392, 0.342748392, 1.381331695, 1.381331695, 1.381331695], degree=2, weights=[1, 0.868170926, 1]))
            Line((-1.120854898, 1.454553053), (-1.214475951, 1.454553068))
            add(Edge.make_bspline(
                [(-1.214475951, 1.454553068), (-2.800132813, 1.454553068), (-2.800132813, 0.203397992)],
                knots=[4.81203319, 4.81203319, 4.81203319, 6.344970327, 6.344970327, 6.344970327], degree=2, weights=[1, 0.720364542, 1]))
            Line((-2.800132813, 0.203397992), (-2.800132806, 0.073267738))
            add(Edge.make_bspline(
                [(-2.800132806, 0.073267738), (-2.800132806, -1.177887338), (-1.214475944, -1.177887338)],
                knots=[3.079807634, 3.079807634, 3.079807634, 4.612744771, 4.612744771, 4.612744771], degree=2, weights=[1, 0.720364542, 1]))
            Line((-1.214475944, -1.177887338), (-1.120854891, -1.177887375))
            add(Edge.make_bspline(
                [(-1.120854891, -1.177887375), (-0.178053419, -1.177887375), (0.240244143, -0.536753002)],
                knots=[1.760260959, 1.760260959, 1.760260959, 2.798844261, 2.798844261, 2.798844261], degree=2, weights=[1, 0.868170926, 1]))
            ThreePointArc((0.240244143, -0.536753002), (0.313994237, -0.417650167), (0.372658208, -0.290437354))
            ThreePointArc((0.372658208, -0.290437354), (0.384251196, -0.24211404), (0.382489087, -0.192450825))
            ThreePointArc((0.382489087, -0.192450825), (0.370484527, -0.171527836), (0.347824512, -0.163257123))
            Line((0.347824512, -0.163257123), (-0.58348421, -0.163257123))
            ThreePointArc((-0.58348421, -0.163257123), (-0.62125204, -0.175257922), (-0.645165579, -0.206858093))
            add(Edge.make_bspline(
                [(-1.141657158, -0.577741646), (-0.776549247, -0.578100851), (-0.645165579, -0.206858093)],
                knots=[5.955155363, 5.955155363, 5.955155363, 7.020735545, 7.020735545, 7.020735545], degree=2, weights=[1, 0.86139323, 1]))
            add(Edge.make_bspline(
                [(-1.201450314, 0.854894524), (-1.823540048, 0.823436889), (-1.793554178, 0.104979402), (-1.763568309, -0.613478086), (-1.141657158, -0.577741646)],
                knots=[3.181025595, 3.181025595, 3.181025595, 4.754799698, 4.754799698, 6.328573801, 6.328573801, 6.328573801], degree=2, weights=[1, 0.706053195, 1, 0.706053195, 1]))
            add(Edge.make_bspline(
                [(-0.645165584, 0.487388037), (-0.79140441, 0.900606071), (-1.201450314, 0.854894524)],
                knots=[2.404042441, 2.404042441, 2.404042441, 3.565685694, 3.565685694, 3.565685694], degree=2, weights=[1, 0.836012096, 1]))
            ThreePointArc((-0.645165584, 0.487388037), (-0.621252025, 0.455787841), (-0.583484164, 0.443787032))
        make_face()
        with BuildLine():
            Line((-3.89178871, 0.443787032), (-2.955953786, 0.443787032))
            ThreePointArc((-2.955953786, 0.443787032), (-2.937643536, 0.451874816), (-2.926709688, 0.468641703))
            ThreePointArc((-2.926709688, 0.468641703), (-2.923523234, 0.512633483), (-2.930898247, 0.556119567))
            ThreePointArc((-2.930898247, 0.556119567), (-2.991346096, 0.689104808), (-3.068060358, 0.81341868))
            add(Edge.make_bspline(
                [(-3.068060358, 0.81341868), (-3.48635792, 1.454553053), (-4.429159392, 1.454553053)],
                knots=[0.342748392, 0.342748392, 0.342748392, 1.381331695, 1.381331695, 1.381331695], degree=2, weights=[1, 0.868170926, 1]))
            Line((-4.429159392, 1.454553053), (-4.522780446, 1.454553068))
            add(Edge.make_bspline(
                [(-4.522780446, 1.454553068), (-6.108437307, 1.454553068), (-6.108437307, 0.203397992)],
                knots=[4.81203319, 4.81203319, 4.81203319, 6.344970327, 6.344970327, 6.344970327], degree=2, weights=[1, 0.720364542, 1]))
            Line((-6.108437307, 0.203397992), (-6.108437352, 0.073267738))
            add(Edge.make_bspline(
                [(-6.108437352, 0.073267738), (-6.108437352, -1.177887338), (-4.52278049, -1.177887338)],
                knots=[3.079807634, 3.079807634, 3.079807634, 4.612744771, 4.612744771, 4.612744771], degree=2, weights=[1, 0.720364542, 1]))
            Line((-4.52278049, -1.177887338), (-4.429159437, -1.177887375))
            add(Edge.make_bspline(
                [(-4.429159437, -1.177887375), (-3.486357965, -1.177887375), (-3.068060402, -0.536753002)],
                knots=[1.760260959, 1.760260959, 1.760260959, 2.798844261, 2.798844261, 2.798844261], degree=2, weights=[1, 0.868170926, 1]))
            ThreePointArc((-3.068060402, -0.536753002), (-2.994310308, -0.417650167), (-2.935646337, -0.290437354))
            ThreePointArc((-2.935646337, -0.290437354), (-2.92405335, -0.24211404), (-2.925815458, -0.192450825))
            ThreePointArc((-2.925815458, -0.192450825), (-2.937820019, -0.171527836), (-2.960480033, -0.163257123))
            Line((-2.960480033, -0.163257123), (-3.891788755, -0.163257123))
            ThreePointArc((-3.891788755, -0.163257123), (-3.929556585, -0.175257922), (-3.953470124, -0.206858093))
            add(Edge.make_bspline(
                [(-4.449961703, -0.577741646), (-4.084853792, -0.578100851), (-3.953470124, -0.206858093)],
                knots=[5.955155363, 5.955155363, 5.955155363, 7.020735545, 7.020735545, 7.020735545], degree=2, weights=[1, 0.86139323, 1]))
            add(Edge.make_bspline(
                [(-4.509754859, 0.854894524), (-5.131844593, 0.82343689), (-5.101858724, 0.104979402), (-5.071872854, -0.613478086), (-4.449961703, -0.577741646)],
                knots=[3.181025595, 3.181025595, 3.181025595, 4.754799698, 4.754799698, 6.328573801, 6.328573801, 6.328573801], degree=2, weights=[1, 0.706053195, 1, 0.706053195, 1]))
            add(Edge.make_bspline(
                [(-3.95347013, 0.487388037), (-4.099708956, 0.900606071), (-4.509754859, 0.854894524)],
                knots=[2.40404244, 2.40404244, 2.40404244, 3.565685694, 3.565685694, 3.565685694], degree=2, weights=[1, 0.836012096, 1]))
            ThreePointArc((-3.95347013, 0.487388037), (-3.92955657, 0.455787841), (-3.89178871, 0.443787032))
        make_face()
    extrude(amount=CUT_EXTRUDE3_DEPTH, mode=Mode.SUBTRACT)


solid = part.part
